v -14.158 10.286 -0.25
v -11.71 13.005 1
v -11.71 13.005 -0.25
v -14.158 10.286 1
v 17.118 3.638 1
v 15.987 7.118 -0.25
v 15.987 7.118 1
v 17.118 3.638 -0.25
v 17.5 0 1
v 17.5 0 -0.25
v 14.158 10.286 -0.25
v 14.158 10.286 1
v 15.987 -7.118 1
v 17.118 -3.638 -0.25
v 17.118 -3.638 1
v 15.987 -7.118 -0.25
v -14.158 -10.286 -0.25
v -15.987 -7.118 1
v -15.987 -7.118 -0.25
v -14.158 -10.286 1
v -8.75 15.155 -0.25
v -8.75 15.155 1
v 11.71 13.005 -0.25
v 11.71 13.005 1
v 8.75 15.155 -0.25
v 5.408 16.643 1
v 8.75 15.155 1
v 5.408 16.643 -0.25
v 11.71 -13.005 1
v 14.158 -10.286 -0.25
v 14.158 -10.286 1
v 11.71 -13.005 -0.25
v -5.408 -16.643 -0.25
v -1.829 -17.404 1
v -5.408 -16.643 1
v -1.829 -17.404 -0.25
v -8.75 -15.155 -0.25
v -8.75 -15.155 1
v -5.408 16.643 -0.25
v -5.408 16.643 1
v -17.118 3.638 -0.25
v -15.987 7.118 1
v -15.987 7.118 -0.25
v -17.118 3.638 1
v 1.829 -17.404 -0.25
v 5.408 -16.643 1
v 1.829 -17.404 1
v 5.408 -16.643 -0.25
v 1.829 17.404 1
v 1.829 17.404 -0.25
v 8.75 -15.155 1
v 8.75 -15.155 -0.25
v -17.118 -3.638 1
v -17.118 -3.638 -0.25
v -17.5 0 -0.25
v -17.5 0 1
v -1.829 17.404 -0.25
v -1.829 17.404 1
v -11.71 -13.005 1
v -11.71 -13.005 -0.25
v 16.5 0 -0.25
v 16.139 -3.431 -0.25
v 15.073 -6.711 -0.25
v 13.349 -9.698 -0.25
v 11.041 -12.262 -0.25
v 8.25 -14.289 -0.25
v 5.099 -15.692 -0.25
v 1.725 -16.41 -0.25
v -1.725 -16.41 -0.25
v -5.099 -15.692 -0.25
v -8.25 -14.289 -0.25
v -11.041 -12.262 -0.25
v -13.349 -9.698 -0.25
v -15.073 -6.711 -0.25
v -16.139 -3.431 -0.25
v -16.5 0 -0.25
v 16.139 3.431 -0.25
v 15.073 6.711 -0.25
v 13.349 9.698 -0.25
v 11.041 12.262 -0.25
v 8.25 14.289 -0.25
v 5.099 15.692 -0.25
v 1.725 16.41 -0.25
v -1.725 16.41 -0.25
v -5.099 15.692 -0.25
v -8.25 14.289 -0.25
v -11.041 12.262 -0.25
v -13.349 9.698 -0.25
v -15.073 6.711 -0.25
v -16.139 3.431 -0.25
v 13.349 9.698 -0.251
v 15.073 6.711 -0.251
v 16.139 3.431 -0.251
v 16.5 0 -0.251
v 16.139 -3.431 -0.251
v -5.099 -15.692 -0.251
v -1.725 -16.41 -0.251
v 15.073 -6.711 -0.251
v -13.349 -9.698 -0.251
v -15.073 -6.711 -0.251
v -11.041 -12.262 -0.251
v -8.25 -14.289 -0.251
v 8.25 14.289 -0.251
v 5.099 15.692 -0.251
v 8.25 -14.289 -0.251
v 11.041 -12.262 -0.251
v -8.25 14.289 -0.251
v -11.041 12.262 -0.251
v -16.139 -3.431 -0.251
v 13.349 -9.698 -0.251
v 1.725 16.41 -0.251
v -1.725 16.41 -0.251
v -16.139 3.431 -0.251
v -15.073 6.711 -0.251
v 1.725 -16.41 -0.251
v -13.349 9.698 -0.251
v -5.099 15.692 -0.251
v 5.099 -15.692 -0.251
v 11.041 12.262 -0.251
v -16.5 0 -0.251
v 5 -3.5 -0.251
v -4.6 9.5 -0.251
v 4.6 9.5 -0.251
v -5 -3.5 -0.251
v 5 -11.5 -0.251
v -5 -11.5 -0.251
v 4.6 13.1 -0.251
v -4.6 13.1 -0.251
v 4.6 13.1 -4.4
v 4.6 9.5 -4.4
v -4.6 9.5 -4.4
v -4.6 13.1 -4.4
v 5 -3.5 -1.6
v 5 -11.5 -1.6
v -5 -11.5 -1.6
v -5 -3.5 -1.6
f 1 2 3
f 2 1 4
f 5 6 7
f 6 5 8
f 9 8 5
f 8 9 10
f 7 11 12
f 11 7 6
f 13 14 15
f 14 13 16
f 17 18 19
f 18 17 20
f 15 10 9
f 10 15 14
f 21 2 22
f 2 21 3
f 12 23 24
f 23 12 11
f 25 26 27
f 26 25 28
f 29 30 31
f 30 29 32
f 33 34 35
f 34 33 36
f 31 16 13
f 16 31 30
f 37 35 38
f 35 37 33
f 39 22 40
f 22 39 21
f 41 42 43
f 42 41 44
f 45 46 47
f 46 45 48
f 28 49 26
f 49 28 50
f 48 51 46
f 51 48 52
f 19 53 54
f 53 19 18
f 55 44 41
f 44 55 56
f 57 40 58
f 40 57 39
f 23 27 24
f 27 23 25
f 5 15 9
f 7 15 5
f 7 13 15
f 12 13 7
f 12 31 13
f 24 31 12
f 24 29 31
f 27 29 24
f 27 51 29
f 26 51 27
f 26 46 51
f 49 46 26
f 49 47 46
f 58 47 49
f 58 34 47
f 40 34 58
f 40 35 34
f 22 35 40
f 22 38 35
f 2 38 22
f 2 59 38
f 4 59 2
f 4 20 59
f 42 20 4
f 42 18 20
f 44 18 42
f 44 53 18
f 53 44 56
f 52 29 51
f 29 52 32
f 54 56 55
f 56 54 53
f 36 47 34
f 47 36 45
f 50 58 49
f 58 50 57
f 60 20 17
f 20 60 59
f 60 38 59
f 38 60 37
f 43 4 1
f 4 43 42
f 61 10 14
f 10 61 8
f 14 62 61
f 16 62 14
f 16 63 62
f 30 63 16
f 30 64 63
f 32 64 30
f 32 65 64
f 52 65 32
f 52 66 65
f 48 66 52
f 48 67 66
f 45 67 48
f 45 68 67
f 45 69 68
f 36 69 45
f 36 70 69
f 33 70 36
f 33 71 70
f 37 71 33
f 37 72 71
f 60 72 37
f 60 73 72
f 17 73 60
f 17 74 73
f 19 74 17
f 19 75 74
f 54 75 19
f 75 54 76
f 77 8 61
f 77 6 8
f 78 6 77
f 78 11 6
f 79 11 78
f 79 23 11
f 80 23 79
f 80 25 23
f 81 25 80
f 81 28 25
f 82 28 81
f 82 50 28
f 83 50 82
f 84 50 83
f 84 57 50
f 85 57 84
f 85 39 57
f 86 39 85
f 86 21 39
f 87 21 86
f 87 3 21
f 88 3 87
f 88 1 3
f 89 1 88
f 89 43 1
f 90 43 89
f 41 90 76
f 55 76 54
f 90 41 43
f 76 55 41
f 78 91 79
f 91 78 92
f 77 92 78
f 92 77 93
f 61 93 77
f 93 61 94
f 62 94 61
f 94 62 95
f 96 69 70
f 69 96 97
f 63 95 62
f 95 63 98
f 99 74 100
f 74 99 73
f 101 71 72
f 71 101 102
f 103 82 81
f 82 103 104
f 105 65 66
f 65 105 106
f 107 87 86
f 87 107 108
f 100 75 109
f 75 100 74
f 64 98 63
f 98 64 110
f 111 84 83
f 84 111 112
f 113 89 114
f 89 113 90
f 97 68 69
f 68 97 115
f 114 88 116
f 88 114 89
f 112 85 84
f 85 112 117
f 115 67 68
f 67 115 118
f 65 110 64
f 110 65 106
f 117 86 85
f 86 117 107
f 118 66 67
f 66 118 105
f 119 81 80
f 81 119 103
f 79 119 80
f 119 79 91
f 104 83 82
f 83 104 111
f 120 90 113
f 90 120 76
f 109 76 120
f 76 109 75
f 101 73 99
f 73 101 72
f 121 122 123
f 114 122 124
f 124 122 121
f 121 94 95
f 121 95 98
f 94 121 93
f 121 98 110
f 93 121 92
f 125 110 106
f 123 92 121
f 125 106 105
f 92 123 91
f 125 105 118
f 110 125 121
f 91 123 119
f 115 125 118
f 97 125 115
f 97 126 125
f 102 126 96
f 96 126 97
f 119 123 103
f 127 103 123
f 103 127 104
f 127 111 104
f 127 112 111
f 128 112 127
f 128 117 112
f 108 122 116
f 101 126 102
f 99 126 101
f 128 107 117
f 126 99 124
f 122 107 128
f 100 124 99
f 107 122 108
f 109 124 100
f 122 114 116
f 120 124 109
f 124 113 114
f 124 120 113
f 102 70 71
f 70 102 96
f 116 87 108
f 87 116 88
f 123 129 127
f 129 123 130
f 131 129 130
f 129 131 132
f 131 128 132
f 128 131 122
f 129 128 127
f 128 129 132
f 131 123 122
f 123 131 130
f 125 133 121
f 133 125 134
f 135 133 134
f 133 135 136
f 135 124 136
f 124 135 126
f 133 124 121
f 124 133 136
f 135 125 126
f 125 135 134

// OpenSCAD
T = 1; // touchpad thickness
ADH = .25; // adhesive thickness
R = 35 / 2; // touchpad radius
SAFE = 1; // safe zone width

module touchpad() {
  color("#1a1c2c")
    cylinder(h=T, r=R);
  color("yellow")
    translate([0, 0, -ADH])
      cylinder(h=ADH, r=R);
  color("red")
    translate([0, 0, -ADH - .001])
      cylinder(h=ADH, r=R - SAFE);
  color("white")
    translate([-9.2 / 2, R - 8, -4.4])
      cube([9.2, 3.6, 4.4]);
  color("gray")
    translate([-10 / 2, 6 - R, -1.6])
      cube([10, 8, 1.601]);
}

touchpad();
